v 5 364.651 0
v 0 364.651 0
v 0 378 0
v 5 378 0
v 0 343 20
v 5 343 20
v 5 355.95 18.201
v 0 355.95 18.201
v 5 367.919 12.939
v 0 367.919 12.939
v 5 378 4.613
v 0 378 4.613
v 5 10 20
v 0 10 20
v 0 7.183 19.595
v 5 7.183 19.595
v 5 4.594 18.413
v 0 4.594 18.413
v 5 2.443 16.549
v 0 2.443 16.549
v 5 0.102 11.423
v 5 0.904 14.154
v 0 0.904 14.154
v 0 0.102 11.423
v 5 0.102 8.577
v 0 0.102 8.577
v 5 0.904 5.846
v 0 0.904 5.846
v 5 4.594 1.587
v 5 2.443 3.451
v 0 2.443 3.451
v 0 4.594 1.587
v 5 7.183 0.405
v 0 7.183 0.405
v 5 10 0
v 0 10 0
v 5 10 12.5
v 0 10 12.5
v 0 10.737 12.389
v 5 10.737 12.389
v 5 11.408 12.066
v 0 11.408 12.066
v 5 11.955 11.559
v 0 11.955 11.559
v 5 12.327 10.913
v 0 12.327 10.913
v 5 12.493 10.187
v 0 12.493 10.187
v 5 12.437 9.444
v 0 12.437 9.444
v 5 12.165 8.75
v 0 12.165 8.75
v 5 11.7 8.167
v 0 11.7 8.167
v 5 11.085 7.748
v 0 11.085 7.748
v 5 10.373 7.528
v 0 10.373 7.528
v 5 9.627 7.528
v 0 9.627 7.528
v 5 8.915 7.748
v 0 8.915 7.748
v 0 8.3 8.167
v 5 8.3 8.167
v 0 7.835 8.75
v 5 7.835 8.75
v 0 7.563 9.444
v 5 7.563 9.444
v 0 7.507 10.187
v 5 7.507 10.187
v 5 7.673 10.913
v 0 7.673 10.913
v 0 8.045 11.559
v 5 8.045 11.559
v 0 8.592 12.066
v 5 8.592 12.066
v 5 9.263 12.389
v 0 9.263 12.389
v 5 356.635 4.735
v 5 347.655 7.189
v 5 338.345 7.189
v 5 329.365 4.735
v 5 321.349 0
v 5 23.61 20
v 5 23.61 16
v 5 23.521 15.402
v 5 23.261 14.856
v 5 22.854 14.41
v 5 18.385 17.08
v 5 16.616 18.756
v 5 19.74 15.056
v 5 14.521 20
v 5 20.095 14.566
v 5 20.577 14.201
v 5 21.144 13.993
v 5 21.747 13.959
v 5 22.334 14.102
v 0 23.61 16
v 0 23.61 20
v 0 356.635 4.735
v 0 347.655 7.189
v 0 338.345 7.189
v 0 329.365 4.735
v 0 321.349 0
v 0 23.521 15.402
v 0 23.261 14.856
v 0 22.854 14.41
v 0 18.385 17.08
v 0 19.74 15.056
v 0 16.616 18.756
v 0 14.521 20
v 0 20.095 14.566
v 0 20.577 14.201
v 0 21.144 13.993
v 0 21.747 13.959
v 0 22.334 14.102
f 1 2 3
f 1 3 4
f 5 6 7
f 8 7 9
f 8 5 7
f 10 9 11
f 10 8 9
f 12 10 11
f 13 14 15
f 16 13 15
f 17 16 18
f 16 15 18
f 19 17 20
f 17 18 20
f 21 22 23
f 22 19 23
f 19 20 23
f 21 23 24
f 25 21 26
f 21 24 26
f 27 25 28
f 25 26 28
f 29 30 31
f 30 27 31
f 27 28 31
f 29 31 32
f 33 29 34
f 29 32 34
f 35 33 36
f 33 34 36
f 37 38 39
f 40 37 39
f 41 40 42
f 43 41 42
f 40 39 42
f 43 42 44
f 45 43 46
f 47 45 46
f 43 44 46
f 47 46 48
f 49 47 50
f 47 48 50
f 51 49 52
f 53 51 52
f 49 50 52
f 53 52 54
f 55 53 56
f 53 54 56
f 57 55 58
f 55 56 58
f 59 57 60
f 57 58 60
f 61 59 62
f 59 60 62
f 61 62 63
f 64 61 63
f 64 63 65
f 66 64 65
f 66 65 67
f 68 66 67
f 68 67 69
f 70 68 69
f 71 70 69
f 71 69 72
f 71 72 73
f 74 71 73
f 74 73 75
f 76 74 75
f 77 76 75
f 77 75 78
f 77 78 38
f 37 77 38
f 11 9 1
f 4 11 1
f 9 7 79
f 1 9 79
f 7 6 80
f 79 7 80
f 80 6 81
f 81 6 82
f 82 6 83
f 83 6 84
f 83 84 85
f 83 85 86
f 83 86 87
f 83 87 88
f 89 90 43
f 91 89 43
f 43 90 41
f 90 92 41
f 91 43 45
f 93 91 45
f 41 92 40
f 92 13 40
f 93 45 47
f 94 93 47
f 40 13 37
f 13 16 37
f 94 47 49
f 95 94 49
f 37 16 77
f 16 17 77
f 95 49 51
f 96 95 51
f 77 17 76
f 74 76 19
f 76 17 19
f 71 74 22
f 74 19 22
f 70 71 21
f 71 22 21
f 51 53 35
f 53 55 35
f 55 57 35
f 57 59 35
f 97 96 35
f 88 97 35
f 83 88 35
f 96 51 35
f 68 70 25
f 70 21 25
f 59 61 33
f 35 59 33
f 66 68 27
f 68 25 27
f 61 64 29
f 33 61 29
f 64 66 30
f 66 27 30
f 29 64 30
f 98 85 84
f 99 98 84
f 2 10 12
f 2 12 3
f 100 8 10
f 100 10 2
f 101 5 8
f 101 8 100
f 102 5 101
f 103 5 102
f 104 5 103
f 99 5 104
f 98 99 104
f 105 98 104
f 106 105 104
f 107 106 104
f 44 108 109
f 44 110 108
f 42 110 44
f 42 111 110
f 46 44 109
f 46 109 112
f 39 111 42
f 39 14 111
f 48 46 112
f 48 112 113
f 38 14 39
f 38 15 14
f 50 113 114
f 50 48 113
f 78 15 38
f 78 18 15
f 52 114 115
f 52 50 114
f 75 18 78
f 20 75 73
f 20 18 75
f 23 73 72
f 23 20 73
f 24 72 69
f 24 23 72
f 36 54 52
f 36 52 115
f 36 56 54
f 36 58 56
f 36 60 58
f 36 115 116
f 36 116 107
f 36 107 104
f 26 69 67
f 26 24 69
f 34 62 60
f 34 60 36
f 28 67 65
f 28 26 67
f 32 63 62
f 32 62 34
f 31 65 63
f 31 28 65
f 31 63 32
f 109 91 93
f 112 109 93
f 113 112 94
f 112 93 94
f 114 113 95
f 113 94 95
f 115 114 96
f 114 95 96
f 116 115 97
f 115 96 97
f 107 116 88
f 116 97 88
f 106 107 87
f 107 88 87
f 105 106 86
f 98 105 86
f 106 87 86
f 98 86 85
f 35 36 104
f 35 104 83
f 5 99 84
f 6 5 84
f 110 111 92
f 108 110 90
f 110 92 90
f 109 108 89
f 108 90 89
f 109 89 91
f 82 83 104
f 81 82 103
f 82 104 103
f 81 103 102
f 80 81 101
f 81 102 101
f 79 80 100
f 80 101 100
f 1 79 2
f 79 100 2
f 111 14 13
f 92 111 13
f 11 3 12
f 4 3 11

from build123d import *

# Parameters (mm, degrees)
SKETCH_1_W          = 5
SKETCH_1_H          = 20
EXTRUDE_1_DEPTH     = 378
CUT_EXTRUDE_1_DEPTH = 6
SKETCH_3_R          = 2.5
CUT_EXTRUDE_2_DEPTH = 6
SKETCH_4_R          = 35
CUT_EXTRUDE_3_DEPTH = 6
CUT_EXTRUDE_4_DEPTH = 6
CUT_EXTRUDE_5_DEPTH = 6


with BuildPart() as part:
    # Эскиз1 → Бобышка-Вытянуть1 (new body)
    with BuildSketch(Plane(origin=(0, 0, 0), x_dir=(1, 0, 0), z_dir=(0, 1, 0))):
        with Locations((2.5, -10)):
            Rectangle(SKETCH_1_W, SKETCH_1_H)
    extrude(amount=EXTRUDE_1_DEPTH)

    # Эскиз2 → Вырез-Вытянуть1 (cut, through all)
    with BuildSketch(Plane.ZY):
        with BuildLine():
            Line((0, 10), (0, -2))
            Line((0, -2), (20, -2))
            Line((20, -2), (20, 10))
            ThreePointArc((20, 10), (10, 0), (0, 10))
        make_face()
    extrude(amount=-CUT_EXTRUDE_1_DEPTH, mode=Mode.SUBTRACT)

    # Эскиз3 → Вырез-Вытянуть2 (cut, through all)
    with BuildSketch(Plane.ZY):
        with Locations((10, 10)):
            Circle(SKETCH_3_R)
    extrude(amount=-CUT_EXTRUDE_2_DEPTH, mode=Mode.SUBTRACT)

    # Эскиз4 → Вырез-Вытянуть3 (cut, through all)
    with BuildSketch(Plane.ZY):
        with Locations((-27.5, 343)):
            Circle(SKETCH_4_R)
    extrude(amount=-CUT_EXTRUDE_3_DEPTH, mode=Mode.SUBTRACT)

    # Эскиз5 → Вырез-Вытянуть4 (cut, through all)
    with BuildSketch(Plane.ZY):
        with BuildLine():
            Line((0, 381.729833462), (20, 378))
            Line((20, 378), (20, 343))
            ThreePointArc((20, 343), (14.70485754, 364.794494718), (0, 381.729833462))
        make_face()
    extrude(amount=-CUT_EXTRUDE_4_DEPTH, mode=Mode.SUBTRACT)

    # Эскиз6 → Вырез-Вытянуть5 (cut, through all)
    with BuildSketch(Plane(origin=(5, 0, 0), x_dir=(0, 0, -1), z_dir=(1, 0, 0))):
        with BuildLine():
            Line((-16, 23.61), (-20, 23.61))
            Line((-20, 23.61), (-20, 19.51))
            Line((-20, 19.51), (-20, 14.520650354))
            ThreePointArc((-20, 14.520650354), (-17.967405564, 17.546968146), (-15.055614801, 19.740484516))
            ThreePointArc((-15.055614801, 19.740484516), (-14.008454527, 22.046052085), (-16, 23.61))
        make_face()
    extrude(amount=-CUT_EXTRUDE_5_DEPTH, mode=Mode.SUBTRACT)


solid = part.part
